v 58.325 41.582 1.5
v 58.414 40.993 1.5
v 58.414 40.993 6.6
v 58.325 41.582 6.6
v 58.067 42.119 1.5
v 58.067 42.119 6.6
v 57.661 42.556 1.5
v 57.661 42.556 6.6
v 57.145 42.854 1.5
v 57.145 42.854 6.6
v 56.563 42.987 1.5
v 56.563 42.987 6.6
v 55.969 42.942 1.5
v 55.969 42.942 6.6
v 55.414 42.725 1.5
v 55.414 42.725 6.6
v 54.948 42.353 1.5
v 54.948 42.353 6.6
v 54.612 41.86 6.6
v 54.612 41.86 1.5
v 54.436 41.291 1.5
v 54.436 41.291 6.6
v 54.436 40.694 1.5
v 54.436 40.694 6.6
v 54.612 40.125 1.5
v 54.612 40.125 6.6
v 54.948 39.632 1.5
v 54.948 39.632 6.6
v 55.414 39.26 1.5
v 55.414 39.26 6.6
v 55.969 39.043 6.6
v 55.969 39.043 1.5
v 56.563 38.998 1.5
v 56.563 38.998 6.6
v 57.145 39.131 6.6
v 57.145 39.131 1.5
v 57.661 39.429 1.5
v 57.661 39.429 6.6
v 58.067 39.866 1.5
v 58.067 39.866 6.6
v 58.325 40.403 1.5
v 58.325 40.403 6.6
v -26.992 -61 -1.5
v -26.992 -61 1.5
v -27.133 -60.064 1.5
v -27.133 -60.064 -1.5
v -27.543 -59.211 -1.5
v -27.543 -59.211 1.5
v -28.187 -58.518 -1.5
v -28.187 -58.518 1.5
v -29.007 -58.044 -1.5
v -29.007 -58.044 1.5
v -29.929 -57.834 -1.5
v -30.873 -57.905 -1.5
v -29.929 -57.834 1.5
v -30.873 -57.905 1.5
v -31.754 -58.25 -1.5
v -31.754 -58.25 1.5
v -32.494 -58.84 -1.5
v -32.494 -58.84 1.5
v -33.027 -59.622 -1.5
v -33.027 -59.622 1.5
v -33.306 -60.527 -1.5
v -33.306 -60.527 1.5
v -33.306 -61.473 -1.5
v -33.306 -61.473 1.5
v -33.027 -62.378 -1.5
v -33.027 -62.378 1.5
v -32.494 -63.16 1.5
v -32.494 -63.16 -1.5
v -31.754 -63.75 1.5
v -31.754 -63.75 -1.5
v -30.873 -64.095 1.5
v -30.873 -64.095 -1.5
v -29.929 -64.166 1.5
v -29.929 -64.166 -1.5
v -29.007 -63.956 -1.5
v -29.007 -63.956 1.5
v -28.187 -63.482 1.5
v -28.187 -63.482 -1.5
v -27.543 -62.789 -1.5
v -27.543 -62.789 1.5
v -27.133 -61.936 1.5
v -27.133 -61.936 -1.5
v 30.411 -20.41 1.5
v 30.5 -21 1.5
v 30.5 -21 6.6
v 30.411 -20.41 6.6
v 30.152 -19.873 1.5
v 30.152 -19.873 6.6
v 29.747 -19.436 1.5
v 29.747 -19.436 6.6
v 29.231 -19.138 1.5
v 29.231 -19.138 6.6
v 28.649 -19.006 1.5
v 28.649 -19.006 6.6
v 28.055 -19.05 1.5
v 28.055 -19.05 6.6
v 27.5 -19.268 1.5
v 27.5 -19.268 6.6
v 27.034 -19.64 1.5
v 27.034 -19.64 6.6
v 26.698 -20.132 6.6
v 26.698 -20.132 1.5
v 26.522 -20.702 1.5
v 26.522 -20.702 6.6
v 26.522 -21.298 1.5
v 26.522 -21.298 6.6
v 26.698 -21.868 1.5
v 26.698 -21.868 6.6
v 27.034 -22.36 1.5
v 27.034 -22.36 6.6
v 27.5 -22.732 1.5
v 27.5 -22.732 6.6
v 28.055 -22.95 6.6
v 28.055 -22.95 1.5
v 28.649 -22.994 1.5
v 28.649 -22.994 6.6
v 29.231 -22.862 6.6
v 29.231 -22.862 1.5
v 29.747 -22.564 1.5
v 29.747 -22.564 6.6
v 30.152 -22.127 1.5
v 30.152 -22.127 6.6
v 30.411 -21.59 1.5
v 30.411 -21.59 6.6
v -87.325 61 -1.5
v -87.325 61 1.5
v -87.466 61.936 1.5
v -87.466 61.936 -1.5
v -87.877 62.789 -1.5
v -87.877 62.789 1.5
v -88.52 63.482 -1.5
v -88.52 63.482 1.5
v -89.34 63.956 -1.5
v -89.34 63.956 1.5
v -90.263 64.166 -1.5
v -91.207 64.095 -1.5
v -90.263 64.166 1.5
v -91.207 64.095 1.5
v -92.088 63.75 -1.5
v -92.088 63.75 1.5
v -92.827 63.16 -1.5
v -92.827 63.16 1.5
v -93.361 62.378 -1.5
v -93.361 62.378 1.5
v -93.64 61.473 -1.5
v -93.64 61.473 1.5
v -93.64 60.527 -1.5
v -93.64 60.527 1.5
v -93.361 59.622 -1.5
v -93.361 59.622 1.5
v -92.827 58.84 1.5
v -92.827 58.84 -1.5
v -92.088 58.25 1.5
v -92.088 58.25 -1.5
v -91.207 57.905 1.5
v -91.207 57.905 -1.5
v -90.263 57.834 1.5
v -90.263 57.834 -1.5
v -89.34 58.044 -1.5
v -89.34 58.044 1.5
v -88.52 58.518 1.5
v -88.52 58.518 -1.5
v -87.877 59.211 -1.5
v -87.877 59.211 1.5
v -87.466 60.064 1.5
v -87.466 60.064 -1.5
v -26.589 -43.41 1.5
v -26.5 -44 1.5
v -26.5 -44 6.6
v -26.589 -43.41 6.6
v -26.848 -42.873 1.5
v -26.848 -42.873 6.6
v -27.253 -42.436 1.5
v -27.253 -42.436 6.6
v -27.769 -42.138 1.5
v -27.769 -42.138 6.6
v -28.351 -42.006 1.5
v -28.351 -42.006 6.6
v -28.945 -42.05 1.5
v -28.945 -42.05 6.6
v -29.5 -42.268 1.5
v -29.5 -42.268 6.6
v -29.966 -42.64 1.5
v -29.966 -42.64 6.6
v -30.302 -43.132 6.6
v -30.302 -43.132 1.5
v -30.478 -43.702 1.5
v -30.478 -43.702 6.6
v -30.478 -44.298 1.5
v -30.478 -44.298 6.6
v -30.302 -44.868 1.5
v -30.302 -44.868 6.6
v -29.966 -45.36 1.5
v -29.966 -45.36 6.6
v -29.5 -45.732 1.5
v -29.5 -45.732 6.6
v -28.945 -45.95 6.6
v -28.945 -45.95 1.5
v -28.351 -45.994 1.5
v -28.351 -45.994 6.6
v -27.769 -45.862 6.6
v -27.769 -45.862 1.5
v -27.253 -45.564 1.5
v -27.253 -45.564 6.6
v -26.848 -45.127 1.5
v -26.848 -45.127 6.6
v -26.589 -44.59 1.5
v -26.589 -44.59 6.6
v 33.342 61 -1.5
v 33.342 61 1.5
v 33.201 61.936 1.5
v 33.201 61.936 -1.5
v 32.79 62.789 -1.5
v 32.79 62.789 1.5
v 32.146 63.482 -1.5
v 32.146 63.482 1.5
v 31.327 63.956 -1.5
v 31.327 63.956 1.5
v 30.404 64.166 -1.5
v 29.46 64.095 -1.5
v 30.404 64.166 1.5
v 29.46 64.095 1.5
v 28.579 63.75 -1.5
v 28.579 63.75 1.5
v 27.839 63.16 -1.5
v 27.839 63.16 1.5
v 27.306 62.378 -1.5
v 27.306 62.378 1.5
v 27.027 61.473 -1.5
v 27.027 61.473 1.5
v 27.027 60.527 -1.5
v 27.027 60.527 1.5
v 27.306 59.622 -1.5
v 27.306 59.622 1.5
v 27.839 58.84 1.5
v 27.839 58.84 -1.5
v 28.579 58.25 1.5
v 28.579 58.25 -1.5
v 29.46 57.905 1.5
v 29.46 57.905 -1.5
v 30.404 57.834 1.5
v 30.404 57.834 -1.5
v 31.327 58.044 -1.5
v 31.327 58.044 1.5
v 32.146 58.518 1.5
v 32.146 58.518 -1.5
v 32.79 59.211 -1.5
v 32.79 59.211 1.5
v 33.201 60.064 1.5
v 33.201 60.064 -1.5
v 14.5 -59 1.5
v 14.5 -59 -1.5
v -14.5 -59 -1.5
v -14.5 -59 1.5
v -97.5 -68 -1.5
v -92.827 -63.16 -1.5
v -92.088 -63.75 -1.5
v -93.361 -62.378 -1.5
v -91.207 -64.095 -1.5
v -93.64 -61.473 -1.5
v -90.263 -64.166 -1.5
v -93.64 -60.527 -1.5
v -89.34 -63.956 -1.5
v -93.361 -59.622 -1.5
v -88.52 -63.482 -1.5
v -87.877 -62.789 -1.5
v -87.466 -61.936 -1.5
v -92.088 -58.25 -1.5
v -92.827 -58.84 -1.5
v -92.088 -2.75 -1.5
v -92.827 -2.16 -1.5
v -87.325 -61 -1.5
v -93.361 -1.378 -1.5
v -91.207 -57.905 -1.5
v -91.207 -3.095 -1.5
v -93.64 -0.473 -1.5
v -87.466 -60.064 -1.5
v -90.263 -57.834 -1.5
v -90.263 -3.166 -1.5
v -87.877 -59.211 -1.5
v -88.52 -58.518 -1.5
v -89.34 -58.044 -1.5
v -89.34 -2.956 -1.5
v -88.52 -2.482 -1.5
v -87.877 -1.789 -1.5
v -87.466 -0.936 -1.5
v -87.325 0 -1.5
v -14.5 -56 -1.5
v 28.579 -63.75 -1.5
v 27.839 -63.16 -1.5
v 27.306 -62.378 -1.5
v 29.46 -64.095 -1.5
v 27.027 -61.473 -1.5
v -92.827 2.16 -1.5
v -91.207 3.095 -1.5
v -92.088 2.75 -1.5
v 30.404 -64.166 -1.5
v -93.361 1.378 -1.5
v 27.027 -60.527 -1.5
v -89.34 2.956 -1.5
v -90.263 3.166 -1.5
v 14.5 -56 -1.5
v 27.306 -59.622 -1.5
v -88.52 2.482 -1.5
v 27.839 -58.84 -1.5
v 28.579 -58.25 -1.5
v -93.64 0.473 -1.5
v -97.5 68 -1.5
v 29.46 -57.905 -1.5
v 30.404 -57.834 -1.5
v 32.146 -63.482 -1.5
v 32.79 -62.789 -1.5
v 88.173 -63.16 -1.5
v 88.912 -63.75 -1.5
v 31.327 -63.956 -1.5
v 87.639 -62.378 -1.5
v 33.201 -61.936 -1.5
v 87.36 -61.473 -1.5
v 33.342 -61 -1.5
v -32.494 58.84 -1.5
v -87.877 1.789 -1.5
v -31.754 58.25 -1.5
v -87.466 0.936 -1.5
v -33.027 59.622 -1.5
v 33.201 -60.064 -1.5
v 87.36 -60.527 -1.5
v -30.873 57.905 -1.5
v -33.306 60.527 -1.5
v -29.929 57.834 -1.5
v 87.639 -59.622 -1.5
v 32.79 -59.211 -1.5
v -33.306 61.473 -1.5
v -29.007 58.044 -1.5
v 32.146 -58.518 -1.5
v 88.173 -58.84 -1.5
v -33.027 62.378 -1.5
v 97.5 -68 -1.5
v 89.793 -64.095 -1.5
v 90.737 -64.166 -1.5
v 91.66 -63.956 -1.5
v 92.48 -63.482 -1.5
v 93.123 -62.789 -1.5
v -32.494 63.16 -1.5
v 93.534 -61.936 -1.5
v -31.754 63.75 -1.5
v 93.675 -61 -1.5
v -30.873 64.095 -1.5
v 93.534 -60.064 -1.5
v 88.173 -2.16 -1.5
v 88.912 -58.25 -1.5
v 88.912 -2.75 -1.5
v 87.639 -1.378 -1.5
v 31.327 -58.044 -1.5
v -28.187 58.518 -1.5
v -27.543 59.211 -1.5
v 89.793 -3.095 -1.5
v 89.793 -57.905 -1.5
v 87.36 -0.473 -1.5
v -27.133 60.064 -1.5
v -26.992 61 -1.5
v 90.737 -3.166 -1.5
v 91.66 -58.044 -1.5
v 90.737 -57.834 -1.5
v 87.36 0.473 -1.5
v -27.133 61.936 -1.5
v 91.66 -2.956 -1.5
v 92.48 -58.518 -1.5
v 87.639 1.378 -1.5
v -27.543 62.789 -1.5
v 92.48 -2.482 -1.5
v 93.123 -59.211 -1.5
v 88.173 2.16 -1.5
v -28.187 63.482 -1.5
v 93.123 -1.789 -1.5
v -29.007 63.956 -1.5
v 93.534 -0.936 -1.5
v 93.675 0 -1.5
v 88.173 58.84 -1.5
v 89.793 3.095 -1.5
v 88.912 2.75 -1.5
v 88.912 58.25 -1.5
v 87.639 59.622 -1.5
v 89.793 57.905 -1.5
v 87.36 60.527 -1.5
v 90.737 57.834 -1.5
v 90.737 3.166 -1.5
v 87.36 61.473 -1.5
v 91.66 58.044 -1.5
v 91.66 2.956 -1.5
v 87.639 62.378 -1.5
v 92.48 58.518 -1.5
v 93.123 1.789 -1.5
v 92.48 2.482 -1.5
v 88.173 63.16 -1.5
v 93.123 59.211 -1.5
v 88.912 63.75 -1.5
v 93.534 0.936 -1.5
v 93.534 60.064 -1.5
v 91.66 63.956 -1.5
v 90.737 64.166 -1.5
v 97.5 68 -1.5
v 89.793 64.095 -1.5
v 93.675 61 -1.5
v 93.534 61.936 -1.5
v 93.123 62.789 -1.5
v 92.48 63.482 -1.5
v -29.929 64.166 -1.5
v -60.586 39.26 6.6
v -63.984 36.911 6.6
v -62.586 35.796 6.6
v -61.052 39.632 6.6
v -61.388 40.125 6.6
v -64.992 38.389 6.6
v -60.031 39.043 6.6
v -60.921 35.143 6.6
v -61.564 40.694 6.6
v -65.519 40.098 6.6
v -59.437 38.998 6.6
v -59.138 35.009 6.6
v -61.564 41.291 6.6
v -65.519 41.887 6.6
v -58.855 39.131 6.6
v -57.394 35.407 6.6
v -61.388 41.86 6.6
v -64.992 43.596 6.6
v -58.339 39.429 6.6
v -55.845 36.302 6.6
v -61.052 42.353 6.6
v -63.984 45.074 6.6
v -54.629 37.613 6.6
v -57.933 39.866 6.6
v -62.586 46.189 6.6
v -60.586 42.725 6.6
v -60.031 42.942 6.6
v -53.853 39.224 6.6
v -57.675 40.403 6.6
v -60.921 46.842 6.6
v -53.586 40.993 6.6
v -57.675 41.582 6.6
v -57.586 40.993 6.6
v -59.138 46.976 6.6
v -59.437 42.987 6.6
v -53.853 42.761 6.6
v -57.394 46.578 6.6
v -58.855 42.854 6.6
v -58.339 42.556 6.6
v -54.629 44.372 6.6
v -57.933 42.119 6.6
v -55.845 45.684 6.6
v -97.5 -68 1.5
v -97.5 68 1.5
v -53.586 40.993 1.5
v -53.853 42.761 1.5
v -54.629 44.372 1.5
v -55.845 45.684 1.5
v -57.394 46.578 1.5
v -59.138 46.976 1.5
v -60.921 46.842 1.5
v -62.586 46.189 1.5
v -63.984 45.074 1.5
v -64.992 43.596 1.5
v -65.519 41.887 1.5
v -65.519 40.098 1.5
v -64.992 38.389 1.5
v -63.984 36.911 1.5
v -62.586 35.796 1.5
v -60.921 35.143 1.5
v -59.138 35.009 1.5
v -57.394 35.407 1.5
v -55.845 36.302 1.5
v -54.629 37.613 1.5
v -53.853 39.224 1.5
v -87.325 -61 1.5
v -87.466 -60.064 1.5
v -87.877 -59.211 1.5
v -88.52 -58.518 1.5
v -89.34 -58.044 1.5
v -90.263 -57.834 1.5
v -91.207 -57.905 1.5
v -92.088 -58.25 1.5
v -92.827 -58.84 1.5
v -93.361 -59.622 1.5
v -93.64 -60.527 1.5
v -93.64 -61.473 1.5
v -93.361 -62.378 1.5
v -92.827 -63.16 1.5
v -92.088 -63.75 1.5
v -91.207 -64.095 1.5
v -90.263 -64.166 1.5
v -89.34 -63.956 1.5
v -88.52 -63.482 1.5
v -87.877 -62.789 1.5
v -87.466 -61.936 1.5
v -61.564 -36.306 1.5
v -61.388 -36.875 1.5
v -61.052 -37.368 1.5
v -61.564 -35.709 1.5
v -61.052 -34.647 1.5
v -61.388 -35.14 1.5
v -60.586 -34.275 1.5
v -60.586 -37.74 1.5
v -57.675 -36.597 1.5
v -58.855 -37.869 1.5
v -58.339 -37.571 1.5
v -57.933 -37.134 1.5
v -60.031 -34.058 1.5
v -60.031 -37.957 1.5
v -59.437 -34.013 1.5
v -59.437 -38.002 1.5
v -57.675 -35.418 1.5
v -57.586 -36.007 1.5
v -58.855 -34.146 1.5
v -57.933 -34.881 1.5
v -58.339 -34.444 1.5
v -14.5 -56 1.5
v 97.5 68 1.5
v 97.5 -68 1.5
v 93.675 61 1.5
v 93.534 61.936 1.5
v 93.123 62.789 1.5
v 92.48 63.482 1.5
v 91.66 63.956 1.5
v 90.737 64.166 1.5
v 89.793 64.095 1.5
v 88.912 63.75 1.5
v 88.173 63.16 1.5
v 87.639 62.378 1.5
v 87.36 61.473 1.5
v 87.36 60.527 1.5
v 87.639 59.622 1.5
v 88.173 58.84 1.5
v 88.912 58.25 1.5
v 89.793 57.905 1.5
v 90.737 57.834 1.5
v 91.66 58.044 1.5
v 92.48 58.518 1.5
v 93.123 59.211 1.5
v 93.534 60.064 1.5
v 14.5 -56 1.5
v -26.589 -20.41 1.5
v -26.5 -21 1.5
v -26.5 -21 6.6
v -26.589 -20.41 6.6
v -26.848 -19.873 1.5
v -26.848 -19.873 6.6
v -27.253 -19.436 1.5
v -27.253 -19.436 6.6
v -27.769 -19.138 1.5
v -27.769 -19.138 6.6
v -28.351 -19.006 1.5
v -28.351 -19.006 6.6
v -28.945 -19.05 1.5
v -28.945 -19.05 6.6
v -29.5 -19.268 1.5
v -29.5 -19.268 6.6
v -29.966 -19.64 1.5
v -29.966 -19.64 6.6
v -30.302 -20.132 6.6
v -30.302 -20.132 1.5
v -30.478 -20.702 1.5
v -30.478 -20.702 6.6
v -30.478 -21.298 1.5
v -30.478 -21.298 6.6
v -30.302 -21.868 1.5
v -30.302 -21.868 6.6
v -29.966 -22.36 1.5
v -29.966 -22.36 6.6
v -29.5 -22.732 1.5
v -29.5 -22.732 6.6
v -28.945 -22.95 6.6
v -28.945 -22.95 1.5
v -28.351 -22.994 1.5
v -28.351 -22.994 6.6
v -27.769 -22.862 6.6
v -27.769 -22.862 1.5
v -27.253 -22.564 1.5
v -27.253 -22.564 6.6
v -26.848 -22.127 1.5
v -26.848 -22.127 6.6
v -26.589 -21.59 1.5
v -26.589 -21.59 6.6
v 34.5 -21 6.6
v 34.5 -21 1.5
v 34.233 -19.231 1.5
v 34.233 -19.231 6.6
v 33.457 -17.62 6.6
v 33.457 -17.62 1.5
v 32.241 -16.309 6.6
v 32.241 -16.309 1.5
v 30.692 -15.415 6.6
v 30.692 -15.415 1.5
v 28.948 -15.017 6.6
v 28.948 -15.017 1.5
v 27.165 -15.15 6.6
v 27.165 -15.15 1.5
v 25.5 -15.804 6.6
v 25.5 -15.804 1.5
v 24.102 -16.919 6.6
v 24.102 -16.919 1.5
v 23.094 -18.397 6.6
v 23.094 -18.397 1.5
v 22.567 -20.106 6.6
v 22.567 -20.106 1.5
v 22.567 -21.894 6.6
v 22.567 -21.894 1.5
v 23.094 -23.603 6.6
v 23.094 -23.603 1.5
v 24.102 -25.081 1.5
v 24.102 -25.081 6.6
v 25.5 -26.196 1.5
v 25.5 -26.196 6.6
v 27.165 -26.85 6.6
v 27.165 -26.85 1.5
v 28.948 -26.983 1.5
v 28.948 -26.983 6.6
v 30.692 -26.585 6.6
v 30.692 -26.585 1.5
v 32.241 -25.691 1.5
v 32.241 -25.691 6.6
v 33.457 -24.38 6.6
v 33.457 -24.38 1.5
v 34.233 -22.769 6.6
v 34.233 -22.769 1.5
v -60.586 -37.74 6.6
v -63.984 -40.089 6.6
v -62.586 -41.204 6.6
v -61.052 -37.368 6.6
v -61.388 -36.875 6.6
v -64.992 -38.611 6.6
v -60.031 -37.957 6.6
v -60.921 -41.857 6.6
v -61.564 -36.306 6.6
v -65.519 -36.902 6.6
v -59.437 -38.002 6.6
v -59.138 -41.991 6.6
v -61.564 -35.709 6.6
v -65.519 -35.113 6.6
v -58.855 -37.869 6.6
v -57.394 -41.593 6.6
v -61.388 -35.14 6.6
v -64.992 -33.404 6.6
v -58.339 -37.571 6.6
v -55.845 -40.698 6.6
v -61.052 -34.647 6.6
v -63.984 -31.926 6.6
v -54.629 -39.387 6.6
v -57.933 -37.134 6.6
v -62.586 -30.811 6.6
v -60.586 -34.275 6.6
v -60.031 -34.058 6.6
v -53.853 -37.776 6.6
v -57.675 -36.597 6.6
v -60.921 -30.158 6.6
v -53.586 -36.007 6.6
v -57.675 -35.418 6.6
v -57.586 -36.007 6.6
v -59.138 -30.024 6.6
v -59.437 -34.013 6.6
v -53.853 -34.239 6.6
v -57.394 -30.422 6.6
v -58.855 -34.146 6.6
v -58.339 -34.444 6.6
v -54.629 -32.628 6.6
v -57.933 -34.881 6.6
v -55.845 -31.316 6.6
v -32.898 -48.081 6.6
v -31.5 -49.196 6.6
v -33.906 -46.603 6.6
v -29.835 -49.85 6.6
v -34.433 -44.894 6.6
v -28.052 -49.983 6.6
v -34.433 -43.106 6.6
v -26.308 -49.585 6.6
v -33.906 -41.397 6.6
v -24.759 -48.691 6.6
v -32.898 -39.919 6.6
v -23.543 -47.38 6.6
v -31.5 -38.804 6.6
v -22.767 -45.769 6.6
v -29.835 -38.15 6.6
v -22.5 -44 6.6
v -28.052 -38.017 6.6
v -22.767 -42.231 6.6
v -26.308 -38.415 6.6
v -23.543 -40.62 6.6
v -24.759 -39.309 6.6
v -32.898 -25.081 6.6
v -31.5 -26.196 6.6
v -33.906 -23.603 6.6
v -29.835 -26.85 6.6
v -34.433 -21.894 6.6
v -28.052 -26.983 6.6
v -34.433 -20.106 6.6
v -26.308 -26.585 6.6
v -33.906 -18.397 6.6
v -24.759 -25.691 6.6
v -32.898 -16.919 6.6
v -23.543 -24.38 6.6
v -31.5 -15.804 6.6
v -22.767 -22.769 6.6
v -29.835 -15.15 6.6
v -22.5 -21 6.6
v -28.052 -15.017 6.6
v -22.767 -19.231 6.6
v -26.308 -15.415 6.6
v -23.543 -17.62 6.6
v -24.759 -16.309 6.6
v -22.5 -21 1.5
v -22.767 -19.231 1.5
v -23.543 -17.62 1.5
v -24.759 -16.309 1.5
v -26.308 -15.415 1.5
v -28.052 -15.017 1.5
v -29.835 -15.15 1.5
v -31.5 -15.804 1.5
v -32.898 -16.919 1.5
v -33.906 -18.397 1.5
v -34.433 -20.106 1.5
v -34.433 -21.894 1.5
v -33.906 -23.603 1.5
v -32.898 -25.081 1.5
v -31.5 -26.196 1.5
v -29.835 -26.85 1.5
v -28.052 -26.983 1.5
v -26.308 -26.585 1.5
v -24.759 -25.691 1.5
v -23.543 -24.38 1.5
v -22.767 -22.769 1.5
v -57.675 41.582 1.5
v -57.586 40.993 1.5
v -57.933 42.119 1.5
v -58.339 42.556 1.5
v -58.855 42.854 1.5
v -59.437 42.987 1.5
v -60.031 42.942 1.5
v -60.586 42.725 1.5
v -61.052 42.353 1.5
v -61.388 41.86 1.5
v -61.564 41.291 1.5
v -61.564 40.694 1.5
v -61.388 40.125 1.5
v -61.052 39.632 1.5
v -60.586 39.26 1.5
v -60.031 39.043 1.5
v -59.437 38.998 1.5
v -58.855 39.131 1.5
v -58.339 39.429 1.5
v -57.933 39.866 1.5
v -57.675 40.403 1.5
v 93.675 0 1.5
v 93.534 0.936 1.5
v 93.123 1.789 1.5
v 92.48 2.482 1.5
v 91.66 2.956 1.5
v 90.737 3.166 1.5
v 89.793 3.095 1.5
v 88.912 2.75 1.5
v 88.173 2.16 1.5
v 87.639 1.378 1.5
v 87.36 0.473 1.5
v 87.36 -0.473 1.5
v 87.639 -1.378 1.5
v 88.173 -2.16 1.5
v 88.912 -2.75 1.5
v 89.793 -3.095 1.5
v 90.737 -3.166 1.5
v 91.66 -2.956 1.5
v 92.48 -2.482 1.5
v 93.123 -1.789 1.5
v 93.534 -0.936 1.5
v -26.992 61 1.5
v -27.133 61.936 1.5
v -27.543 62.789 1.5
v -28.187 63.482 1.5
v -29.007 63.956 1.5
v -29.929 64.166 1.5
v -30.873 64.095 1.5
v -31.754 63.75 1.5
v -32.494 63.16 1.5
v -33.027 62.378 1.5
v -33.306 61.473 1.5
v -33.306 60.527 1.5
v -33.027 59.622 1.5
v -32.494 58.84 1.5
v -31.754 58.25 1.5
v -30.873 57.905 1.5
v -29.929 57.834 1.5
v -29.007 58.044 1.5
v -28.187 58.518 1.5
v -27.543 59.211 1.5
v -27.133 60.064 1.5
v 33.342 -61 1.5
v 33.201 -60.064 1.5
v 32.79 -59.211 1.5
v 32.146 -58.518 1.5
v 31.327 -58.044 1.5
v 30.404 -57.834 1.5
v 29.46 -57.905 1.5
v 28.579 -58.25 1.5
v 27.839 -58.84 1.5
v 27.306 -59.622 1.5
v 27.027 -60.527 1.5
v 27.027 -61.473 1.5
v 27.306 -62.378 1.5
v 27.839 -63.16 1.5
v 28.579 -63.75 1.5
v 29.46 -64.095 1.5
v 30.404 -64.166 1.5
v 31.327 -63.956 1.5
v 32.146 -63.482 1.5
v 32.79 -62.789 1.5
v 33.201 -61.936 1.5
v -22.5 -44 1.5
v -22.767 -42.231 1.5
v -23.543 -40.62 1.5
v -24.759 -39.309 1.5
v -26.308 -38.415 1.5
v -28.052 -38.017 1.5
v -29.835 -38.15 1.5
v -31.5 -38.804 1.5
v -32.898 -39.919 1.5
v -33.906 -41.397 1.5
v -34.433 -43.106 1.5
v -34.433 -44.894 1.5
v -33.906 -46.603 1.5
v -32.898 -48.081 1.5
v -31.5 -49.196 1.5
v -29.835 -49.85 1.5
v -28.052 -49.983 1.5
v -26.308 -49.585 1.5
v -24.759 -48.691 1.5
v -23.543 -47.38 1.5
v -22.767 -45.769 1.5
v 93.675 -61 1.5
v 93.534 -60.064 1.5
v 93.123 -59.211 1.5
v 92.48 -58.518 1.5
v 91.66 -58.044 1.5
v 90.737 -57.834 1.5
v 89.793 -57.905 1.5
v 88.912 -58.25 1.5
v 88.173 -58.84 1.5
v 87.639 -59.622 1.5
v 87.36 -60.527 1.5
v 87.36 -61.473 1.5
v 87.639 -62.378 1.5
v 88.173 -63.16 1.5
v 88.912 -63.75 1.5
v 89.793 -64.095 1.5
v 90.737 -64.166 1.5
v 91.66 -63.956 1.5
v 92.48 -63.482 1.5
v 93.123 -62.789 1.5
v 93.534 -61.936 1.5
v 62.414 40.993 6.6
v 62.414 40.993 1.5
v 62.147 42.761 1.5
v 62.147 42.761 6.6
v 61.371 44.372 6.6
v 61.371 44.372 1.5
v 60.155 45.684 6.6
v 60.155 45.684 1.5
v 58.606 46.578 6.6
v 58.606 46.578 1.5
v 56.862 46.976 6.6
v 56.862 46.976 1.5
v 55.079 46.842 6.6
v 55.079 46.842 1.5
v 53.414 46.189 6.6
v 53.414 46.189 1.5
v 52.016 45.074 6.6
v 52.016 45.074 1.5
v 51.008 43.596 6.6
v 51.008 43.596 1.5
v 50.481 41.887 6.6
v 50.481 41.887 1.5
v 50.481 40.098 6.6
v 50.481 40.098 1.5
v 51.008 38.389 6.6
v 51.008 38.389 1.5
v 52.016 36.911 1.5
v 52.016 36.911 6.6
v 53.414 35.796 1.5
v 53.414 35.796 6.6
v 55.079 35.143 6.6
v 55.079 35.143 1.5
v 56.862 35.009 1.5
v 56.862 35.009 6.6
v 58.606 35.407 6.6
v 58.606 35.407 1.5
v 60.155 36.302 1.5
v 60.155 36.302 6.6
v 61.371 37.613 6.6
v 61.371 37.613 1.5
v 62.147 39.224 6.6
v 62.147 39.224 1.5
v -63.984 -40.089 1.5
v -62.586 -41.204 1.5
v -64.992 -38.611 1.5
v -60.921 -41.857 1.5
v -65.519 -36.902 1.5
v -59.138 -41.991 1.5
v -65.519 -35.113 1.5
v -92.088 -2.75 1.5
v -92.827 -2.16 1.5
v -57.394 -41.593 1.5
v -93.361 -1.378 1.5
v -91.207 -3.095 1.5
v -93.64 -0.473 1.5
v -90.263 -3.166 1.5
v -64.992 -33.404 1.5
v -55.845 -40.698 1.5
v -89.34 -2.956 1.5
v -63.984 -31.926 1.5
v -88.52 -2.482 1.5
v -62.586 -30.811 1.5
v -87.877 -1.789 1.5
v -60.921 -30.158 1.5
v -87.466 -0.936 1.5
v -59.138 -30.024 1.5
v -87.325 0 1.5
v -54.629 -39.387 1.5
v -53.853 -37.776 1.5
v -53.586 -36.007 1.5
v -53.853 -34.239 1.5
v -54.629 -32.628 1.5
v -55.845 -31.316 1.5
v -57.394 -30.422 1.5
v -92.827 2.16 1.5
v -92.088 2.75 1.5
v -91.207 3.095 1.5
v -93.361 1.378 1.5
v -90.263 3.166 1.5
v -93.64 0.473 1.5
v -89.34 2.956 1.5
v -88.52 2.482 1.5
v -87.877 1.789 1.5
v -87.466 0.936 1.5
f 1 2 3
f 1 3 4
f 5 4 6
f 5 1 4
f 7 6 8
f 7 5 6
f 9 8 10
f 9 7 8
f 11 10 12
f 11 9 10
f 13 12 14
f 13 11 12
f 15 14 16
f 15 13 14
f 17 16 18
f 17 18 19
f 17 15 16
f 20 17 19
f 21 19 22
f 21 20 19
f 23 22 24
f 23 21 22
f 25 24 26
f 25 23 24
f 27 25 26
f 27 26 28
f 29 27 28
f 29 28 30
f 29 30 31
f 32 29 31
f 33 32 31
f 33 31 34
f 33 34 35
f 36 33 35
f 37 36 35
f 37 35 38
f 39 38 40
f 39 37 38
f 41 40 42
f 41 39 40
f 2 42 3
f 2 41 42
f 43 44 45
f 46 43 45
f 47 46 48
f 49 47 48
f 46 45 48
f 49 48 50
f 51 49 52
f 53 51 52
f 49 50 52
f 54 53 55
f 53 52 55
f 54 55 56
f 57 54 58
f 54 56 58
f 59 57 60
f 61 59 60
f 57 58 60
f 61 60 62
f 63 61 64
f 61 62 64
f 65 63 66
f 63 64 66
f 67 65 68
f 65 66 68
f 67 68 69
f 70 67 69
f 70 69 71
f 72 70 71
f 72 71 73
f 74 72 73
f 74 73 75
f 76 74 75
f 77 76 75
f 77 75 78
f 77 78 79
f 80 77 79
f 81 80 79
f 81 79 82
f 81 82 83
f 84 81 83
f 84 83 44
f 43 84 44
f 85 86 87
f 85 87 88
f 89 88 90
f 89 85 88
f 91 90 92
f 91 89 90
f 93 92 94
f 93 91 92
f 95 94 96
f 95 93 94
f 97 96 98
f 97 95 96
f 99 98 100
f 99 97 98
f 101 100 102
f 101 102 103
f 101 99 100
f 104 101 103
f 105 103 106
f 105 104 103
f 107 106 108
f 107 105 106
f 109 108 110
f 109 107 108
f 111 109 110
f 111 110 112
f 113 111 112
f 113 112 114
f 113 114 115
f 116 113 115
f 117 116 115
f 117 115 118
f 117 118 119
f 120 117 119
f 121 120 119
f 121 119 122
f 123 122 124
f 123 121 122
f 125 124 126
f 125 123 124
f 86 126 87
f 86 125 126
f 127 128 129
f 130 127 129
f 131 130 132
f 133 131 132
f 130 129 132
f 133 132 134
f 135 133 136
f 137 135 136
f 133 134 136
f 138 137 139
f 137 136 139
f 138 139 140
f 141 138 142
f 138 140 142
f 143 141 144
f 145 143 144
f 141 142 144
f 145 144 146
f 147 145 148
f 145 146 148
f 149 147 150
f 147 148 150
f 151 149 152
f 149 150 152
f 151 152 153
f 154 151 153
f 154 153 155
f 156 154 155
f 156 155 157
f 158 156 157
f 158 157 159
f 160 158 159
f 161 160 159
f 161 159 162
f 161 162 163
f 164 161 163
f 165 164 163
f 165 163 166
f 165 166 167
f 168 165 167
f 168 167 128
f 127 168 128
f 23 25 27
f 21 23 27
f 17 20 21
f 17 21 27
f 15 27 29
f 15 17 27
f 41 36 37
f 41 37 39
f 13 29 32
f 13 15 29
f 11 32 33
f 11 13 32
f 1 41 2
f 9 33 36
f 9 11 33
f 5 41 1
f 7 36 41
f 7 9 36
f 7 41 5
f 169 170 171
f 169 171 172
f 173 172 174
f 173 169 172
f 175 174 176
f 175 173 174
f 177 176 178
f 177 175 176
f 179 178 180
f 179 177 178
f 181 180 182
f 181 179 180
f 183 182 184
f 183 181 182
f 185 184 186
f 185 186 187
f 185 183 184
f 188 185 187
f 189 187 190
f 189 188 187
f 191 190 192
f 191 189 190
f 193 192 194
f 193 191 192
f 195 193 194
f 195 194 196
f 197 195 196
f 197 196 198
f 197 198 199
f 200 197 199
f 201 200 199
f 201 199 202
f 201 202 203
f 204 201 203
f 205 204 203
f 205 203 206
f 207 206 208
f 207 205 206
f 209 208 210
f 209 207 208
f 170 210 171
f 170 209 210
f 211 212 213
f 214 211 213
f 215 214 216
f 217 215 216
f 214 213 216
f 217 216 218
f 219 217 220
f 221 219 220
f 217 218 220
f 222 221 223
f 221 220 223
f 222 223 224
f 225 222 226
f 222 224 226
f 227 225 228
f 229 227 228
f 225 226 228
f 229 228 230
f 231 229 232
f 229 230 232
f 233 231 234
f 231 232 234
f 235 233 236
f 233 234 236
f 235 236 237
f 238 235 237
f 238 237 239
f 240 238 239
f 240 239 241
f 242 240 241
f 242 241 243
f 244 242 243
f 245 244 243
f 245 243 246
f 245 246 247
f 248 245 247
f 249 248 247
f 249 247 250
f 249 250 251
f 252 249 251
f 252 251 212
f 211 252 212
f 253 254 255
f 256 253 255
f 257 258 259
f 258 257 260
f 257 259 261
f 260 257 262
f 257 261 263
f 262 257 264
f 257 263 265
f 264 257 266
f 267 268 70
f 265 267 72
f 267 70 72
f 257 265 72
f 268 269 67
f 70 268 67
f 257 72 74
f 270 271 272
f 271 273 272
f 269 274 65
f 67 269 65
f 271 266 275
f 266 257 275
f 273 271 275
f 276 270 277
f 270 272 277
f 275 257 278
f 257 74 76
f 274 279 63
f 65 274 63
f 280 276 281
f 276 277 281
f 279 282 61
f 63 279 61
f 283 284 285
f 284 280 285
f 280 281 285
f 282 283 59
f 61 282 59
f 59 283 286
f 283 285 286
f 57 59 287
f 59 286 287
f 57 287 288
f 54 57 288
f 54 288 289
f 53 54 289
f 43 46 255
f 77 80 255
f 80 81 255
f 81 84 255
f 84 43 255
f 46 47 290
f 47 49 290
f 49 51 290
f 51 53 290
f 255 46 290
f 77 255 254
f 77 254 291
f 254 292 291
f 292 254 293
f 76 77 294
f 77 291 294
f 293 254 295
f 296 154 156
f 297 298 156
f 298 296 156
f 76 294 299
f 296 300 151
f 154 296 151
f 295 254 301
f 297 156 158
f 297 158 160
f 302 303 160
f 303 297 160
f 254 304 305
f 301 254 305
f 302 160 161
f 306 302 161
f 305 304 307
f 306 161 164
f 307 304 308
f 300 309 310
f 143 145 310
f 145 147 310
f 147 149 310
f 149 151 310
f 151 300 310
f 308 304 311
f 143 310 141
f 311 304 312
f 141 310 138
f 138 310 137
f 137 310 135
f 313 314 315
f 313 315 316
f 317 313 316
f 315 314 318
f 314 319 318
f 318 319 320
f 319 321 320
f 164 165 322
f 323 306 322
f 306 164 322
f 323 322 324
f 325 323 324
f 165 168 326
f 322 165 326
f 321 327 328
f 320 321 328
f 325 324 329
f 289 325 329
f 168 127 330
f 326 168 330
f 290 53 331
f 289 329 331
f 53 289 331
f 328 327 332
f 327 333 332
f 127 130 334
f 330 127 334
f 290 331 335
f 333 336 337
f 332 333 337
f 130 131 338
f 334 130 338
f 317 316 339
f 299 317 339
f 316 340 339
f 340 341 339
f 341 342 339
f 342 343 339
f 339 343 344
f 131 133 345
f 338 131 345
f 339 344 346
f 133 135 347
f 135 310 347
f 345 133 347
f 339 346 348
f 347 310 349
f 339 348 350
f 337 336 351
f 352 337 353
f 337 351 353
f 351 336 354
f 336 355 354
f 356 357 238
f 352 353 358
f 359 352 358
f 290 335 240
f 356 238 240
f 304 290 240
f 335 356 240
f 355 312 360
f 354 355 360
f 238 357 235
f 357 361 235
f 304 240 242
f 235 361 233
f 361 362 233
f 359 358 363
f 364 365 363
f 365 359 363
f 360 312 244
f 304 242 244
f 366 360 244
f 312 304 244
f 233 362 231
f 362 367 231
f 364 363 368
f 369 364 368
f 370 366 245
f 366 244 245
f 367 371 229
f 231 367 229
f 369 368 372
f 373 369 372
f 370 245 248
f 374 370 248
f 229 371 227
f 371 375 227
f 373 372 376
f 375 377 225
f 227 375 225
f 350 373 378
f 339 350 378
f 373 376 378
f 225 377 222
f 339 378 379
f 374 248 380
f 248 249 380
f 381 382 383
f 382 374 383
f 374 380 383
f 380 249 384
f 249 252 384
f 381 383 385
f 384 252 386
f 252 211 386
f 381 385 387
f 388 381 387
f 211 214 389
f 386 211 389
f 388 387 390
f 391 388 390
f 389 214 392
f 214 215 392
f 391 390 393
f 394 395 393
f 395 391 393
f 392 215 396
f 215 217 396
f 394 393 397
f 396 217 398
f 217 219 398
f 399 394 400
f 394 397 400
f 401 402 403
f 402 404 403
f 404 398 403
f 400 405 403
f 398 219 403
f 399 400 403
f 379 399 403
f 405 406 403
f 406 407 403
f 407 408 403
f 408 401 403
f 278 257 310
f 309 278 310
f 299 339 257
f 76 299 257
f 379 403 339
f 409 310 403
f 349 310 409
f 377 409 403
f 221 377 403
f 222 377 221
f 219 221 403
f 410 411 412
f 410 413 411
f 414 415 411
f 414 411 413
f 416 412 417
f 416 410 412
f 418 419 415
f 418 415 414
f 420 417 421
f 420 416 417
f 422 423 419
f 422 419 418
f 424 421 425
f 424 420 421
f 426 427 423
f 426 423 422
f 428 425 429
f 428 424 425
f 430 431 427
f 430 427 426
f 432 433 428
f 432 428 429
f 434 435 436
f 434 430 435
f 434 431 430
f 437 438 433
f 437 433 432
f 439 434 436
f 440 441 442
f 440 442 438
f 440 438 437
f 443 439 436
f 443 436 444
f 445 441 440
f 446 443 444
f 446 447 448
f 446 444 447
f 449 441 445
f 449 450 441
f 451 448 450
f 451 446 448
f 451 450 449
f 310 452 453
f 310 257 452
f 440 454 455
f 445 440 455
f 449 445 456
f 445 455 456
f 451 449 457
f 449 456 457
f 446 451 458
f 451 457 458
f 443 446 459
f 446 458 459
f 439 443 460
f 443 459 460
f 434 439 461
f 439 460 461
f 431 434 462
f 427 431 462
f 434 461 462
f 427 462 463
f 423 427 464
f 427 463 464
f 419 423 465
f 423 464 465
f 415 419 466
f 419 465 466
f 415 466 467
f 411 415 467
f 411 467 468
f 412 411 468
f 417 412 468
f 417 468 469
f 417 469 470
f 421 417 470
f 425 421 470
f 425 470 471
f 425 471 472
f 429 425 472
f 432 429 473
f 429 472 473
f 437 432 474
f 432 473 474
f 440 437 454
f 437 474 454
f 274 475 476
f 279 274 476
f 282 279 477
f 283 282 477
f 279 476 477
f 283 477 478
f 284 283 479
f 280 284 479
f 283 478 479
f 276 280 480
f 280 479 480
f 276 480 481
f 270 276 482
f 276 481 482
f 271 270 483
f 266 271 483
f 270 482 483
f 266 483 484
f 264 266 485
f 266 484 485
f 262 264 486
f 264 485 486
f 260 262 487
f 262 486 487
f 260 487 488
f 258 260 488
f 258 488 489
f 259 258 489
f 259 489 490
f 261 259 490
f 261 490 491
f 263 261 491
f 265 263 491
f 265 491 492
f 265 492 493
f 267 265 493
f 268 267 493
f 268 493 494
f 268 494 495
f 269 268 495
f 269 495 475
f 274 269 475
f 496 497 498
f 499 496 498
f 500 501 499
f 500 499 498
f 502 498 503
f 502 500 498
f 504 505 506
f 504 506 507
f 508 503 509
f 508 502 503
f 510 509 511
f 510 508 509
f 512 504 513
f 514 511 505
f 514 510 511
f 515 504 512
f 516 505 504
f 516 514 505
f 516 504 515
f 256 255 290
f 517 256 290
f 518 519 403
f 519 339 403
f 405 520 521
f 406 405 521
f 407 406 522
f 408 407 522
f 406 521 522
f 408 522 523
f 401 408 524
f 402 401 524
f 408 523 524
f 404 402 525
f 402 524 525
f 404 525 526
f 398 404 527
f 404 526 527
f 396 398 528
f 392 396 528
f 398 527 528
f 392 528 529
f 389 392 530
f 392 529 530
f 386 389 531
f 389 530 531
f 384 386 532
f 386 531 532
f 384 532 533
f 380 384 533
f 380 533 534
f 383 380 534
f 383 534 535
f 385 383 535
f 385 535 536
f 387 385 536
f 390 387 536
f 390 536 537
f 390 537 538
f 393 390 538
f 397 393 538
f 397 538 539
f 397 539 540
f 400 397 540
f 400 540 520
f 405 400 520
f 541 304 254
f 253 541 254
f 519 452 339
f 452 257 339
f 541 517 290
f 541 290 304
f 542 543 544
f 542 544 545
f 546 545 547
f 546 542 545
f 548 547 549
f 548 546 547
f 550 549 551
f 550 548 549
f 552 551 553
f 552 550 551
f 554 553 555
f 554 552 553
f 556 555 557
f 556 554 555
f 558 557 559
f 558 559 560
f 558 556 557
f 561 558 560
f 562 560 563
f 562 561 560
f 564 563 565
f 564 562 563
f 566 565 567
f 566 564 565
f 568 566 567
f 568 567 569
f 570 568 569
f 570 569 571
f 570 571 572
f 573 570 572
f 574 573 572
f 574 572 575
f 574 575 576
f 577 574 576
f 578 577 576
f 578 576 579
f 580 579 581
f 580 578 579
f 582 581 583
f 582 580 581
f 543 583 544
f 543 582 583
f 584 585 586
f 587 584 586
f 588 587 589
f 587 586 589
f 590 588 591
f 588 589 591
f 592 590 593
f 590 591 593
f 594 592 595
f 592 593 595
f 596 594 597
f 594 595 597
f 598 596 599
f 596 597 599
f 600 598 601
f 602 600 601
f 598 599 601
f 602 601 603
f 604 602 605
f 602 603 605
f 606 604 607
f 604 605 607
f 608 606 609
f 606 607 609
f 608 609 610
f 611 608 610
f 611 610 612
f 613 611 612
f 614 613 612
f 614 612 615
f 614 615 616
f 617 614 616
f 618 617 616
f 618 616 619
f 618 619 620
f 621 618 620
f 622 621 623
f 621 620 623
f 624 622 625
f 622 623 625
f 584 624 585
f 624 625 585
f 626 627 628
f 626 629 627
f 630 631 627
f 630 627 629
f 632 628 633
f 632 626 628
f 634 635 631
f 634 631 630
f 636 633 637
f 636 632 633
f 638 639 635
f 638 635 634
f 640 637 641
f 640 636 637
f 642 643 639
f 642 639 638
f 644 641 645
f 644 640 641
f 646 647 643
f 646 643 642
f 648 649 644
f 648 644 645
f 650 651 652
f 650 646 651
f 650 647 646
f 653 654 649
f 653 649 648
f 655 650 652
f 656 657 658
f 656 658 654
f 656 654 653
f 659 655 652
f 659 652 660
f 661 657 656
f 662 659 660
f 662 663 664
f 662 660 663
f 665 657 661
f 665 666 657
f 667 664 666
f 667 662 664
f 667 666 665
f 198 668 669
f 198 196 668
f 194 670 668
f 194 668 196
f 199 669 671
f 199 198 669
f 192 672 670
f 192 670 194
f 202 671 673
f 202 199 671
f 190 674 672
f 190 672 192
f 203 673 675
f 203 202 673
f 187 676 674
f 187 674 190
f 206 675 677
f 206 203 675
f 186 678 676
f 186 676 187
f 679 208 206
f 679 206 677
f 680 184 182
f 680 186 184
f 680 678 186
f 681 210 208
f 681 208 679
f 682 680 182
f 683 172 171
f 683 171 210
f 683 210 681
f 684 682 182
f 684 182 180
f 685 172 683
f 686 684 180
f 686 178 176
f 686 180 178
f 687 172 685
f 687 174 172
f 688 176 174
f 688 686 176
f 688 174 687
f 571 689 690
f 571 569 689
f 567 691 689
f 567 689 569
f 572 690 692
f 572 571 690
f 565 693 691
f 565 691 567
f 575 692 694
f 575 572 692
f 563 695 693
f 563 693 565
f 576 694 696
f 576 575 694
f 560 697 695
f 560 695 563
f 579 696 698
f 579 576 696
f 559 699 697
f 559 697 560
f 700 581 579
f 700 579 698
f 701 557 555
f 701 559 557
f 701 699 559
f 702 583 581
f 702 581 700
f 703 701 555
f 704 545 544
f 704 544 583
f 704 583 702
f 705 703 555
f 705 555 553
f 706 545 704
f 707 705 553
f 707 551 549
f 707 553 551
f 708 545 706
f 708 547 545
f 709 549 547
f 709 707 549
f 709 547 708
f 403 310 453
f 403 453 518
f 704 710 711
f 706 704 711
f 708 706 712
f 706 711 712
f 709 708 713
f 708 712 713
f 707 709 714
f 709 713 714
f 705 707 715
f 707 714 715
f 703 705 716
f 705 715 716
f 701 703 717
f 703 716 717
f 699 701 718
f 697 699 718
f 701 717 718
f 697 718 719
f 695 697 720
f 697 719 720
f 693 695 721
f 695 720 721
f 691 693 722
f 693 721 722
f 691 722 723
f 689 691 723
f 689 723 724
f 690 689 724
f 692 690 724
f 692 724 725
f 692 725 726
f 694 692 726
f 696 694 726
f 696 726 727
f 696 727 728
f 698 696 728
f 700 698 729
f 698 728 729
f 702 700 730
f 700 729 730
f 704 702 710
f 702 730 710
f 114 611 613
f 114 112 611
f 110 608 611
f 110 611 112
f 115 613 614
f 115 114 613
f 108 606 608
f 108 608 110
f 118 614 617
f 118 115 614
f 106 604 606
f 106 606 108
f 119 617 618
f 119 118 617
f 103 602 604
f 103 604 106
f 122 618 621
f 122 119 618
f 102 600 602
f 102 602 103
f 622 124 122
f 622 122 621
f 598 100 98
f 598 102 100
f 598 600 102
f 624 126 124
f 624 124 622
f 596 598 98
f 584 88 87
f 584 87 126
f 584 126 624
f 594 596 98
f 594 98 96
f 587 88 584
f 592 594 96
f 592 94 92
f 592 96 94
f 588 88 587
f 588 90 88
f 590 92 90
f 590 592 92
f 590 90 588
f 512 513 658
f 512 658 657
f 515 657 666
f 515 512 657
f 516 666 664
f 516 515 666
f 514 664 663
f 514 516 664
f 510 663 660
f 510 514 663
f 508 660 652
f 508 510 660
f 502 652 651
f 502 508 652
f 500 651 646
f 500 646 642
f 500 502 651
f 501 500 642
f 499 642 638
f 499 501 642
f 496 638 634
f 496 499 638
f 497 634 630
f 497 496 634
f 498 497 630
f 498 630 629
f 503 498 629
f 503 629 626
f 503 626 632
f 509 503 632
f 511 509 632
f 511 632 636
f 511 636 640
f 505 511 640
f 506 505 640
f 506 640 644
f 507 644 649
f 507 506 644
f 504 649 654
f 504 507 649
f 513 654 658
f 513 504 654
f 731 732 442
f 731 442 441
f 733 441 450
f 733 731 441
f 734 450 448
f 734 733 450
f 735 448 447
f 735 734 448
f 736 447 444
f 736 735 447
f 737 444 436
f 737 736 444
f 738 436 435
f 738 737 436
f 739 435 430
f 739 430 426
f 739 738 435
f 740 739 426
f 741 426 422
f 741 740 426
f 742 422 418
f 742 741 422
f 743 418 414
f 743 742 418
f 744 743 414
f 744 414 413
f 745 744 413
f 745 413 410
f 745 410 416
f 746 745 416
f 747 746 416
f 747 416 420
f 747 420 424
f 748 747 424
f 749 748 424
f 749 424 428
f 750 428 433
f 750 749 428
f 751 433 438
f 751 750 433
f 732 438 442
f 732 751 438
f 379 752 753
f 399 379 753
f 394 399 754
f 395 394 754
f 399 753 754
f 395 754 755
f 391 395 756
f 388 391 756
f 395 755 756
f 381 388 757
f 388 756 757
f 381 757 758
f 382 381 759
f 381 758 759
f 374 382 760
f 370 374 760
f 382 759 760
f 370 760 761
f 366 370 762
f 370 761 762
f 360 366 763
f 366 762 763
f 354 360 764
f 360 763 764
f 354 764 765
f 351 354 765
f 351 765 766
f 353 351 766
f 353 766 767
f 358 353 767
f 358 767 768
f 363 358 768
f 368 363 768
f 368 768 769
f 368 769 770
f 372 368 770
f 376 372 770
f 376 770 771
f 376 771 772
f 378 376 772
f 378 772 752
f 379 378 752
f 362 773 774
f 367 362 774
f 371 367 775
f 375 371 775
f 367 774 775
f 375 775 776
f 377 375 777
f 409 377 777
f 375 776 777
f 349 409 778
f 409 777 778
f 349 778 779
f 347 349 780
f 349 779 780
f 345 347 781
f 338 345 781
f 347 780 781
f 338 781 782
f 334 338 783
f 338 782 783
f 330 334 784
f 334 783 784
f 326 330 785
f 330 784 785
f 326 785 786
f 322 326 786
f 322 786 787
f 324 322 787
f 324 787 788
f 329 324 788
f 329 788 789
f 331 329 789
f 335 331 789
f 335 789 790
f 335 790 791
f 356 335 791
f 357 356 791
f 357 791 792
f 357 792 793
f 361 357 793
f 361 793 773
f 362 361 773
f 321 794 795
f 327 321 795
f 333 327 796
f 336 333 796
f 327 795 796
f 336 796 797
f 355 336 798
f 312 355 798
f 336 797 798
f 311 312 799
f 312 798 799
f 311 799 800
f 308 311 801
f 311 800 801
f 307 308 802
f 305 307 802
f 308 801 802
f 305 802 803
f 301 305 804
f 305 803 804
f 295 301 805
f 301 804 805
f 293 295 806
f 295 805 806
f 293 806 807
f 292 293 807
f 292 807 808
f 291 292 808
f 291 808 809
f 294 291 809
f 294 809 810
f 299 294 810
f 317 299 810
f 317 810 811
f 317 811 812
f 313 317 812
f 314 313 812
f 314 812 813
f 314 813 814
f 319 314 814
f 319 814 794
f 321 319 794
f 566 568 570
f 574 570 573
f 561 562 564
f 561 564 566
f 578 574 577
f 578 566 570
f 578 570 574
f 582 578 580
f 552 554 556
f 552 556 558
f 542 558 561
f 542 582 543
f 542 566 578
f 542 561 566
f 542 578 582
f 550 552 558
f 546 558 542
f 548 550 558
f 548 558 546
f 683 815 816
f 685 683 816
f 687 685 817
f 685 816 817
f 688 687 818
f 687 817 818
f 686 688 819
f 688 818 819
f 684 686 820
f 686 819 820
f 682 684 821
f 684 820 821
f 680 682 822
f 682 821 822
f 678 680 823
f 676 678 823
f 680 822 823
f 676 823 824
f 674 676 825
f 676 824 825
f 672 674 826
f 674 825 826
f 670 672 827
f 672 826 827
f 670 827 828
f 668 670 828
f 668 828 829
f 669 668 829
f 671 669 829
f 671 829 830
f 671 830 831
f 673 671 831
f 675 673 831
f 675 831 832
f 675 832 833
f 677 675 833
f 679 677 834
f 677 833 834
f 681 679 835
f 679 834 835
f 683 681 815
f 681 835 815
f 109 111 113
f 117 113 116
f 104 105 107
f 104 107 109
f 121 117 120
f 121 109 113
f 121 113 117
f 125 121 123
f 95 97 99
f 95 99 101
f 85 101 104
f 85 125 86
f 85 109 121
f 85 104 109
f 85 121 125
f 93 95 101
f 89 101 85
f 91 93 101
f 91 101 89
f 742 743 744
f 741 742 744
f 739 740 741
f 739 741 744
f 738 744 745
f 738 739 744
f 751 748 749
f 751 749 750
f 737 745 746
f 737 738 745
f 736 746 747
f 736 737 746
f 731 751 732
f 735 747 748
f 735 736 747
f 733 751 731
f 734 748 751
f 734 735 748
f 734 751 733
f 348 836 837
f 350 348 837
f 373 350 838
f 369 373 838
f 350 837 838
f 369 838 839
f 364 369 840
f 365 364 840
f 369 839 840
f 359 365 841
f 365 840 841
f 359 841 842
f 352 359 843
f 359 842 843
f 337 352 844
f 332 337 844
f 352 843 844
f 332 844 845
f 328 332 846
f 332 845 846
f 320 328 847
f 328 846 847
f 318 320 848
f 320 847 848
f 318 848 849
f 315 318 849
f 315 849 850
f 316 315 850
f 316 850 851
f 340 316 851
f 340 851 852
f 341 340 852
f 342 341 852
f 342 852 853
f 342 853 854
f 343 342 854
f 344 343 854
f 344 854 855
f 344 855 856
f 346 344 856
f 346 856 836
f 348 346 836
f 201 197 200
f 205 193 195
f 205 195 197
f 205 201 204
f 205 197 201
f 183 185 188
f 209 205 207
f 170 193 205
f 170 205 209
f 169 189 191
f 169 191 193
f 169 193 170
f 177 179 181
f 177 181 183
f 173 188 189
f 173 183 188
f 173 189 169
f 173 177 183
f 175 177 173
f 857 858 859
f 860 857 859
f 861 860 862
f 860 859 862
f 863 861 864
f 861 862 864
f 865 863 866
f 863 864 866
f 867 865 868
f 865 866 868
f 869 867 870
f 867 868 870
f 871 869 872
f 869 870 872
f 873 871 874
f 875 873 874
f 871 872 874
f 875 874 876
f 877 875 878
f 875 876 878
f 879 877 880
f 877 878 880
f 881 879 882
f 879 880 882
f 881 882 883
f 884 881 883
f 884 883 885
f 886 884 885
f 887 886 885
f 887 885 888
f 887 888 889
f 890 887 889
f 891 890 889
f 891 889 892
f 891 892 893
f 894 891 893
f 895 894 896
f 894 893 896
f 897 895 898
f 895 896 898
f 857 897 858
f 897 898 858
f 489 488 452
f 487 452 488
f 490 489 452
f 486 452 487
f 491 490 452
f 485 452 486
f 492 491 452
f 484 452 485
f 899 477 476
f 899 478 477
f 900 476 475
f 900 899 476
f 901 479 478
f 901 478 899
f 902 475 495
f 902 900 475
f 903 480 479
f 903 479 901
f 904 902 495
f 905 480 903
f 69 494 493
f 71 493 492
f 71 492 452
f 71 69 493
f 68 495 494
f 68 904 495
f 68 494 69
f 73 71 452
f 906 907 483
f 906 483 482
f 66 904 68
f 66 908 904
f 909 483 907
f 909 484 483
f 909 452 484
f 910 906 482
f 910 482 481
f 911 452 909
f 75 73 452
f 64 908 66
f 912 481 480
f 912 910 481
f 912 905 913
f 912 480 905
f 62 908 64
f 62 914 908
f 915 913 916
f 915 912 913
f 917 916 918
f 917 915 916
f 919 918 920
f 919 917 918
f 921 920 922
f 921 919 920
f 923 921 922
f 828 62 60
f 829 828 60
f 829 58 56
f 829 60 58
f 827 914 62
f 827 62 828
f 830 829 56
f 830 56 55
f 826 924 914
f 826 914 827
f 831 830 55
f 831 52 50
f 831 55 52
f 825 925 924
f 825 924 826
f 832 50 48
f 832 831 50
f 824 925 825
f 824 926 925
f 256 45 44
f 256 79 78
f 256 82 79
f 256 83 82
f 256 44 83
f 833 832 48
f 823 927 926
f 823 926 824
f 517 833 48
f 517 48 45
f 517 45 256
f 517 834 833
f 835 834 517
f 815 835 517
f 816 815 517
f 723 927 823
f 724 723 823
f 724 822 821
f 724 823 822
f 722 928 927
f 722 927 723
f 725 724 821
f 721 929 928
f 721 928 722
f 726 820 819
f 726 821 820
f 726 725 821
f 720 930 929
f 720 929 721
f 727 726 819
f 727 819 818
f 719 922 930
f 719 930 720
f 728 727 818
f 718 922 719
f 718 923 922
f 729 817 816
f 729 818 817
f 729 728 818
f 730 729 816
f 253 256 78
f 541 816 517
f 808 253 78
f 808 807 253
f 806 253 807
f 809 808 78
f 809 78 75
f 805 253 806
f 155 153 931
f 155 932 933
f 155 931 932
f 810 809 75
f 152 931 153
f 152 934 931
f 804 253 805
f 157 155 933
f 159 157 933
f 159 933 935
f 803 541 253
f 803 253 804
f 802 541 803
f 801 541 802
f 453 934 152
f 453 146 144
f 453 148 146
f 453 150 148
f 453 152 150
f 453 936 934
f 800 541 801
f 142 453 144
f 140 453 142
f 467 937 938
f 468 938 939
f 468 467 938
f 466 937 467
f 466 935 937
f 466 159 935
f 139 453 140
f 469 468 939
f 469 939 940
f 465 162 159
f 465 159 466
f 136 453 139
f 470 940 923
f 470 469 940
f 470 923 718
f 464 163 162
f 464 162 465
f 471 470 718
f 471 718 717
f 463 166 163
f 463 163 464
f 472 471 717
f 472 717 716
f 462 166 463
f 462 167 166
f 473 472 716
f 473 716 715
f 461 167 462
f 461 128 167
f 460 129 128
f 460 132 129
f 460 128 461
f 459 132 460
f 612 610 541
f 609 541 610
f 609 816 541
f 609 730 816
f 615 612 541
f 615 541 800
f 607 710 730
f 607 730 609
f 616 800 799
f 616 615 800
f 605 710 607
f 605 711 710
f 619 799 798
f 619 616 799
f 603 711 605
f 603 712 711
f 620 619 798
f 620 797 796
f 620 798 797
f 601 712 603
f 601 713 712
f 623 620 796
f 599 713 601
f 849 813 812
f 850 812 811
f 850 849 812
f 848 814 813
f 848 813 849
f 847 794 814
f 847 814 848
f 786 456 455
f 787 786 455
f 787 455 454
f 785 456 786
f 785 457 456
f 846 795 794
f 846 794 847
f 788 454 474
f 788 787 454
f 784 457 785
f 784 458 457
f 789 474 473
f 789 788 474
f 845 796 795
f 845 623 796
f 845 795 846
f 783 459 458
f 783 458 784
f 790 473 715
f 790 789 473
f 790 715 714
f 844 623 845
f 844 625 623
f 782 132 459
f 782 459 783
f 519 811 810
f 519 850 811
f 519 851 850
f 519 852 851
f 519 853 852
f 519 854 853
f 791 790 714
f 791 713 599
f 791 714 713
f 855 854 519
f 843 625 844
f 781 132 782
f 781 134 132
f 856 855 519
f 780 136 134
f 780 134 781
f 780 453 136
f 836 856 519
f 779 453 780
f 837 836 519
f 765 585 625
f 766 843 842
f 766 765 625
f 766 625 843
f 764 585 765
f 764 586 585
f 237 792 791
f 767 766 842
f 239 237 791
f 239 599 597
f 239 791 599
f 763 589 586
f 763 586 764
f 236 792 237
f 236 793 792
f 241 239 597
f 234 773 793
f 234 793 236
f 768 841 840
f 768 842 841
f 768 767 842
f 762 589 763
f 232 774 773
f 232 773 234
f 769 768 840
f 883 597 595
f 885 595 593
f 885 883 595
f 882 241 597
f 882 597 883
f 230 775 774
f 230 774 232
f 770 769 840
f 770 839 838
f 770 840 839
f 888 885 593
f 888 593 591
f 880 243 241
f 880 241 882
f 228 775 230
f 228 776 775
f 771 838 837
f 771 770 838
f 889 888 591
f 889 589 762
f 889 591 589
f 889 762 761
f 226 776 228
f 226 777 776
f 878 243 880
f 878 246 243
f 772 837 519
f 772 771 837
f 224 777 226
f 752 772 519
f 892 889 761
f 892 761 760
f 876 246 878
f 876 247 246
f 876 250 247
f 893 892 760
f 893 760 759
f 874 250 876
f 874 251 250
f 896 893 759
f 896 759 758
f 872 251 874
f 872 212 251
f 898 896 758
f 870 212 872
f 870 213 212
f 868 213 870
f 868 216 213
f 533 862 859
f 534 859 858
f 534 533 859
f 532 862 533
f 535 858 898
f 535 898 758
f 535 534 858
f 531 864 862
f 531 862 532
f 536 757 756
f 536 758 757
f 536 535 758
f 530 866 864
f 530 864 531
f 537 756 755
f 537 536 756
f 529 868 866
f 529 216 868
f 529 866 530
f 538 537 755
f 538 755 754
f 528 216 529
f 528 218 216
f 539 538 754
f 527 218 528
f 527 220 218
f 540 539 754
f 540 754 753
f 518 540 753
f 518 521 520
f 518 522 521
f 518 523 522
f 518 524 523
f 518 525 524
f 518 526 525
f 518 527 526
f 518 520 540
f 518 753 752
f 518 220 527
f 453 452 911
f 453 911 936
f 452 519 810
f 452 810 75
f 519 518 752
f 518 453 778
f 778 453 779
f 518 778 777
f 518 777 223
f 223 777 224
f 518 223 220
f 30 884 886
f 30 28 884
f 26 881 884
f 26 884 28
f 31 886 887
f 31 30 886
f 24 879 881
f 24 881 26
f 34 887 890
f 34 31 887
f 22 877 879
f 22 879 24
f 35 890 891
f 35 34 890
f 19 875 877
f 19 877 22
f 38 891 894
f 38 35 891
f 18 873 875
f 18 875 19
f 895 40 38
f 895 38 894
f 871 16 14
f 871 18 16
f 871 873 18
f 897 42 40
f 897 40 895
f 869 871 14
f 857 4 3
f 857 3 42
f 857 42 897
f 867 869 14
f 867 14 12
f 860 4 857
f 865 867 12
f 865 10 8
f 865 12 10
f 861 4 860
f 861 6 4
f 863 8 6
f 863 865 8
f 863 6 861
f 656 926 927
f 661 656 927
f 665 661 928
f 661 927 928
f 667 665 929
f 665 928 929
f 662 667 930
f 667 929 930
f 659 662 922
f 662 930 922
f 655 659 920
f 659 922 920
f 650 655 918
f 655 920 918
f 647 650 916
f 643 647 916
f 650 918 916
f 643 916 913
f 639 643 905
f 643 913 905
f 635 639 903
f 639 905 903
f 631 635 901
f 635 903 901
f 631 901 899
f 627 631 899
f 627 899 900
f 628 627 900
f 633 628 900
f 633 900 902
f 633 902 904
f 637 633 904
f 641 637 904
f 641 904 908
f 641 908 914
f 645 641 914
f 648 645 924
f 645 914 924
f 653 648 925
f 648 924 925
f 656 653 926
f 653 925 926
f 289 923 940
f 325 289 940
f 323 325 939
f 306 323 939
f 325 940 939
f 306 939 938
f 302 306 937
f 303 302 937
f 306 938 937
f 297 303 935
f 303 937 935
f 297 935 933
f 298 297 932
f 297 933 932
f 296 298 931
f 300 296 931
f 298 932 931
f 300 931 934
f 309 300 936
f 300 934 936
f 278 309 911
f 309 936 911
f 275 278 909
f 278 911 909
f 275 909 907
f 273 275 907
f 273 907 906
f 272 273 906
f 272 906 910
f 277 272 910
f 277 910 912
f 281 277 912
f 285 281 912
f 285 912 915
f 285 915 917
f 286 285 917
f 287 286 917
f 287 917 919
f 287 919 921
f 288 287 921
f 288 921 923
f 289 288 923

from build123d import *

# Parameters (mm, degrees)
SKETCH1_W           = 195
SKETCH1_H           = 136
SKETCH1_W_2         = 29
SKETCH1_H_2         = 3
BOSS_EXTRUDE1_DEPTH = 1.5
SKETCH1_3_W         = 195
SKETCH1_3_H         = 136
SKETCH1_3_W_2       = 29
SKETCH1_3_H_2       = 3
BOSS_EXTRUDE2_DEPTH = 1.5
SKETCH2_R           = 3.175
CUT_EXTRUDE1_DEPTH  = 119.908578328
SKETCH3_R           = 6
SKETCH3_R_2         = 2
BOSS_EXTRUDE3_DEPTH = 5.1
SKETCH4_R           = 6
SKETCH4_R_2         = 2
BOSS_EXTRUDE6_DEPTH = 5.1


with BuildPart() as part:
    # Sketch1 → Boss-Extrude1 (new body)
    with BuildSketch(Plane.XY):
        Rectangle(SKETCH1_W, SKETCH1_H)
        with Locations((0, -57.5)):
            Rectangle(SKETCH1_W_2, SKETCH1_H_2, mode=Mode.SUBTRACT)
    extrude(amount=-BOSS_EXTRUDE1_DEPTH)

    # Sketch1<3> → Boss-Extrude2 (add)
    with BuildSketch(Plane.XY):
        Rectangle(SKETCH1_3_W, SKETCH1_3_H)
        with Locations((0, -57.5)):
            Rectangle(SKETCH1_3_W_2, SKETCH1_3_H_2, mode=Mode.SUBTRACT)
    extrude(amount=BOSS_EXTRUDE2_DEPTH)

    # Sketch2 → Cut-Extrude1 (cut, through all)
    with BuildSketch(Plane.XY.offset(1.5)):
        with Locations((-90.5, 61)):
            Circle(SKETCH2_R)
        with Locations((90.5, 61)):
            Circle(SKETCH2_R)
        with Locations((90.5, -61)):
            Circle(SKETCH2_R)
        with Locations((-90.5, -61)):
            Circle(SKETCH2_R)
        with Locations((-90.5, 0)):
            Circle(SKETCH2_R)
        with Locations((30.166666667, 61)):
            Circle(SKETCH2_R)
        with Locations((90.5, 0)):
            Circle(SKETCH2_R)
        with Locations((30.166666667, -61)):
            Circle(SKETCH2_R)
        with Locations((-30.166666667, -61)):
            Circle(SKETCH2_R)
        with Locations((-30.166666667, 61)):
            Circle(SKETCH2_R)
    extrude(amount=-CUT_EXTRUDE1_DEPTH, mode=Mode.SUBTRACT)

    # Sketch3 → Boss-Extrude3 (add)
    with BuildSketch(Plane.XY.offset(1.5)):
        with Locations((-28.5, -44)):
            Circle(SKETCH3_R)
        with Locations((-28.5, -44)):
            Circle(SKETCH3_R_2, mode=Mode.SUBTRACT)
    boss_extrude3 = extrude(amount=BOSS_EXTRUDE3_DEPTH)

    # Sketch-Pattern1: Boss-Extrude3 at 2 more places
    with Locations((0, 23, 0), (57, 23, 0)):
        add(boss_extrude3)

    # Sketch4 → Boss-Extrude6 (add)
    with BuildSketch(Plane.XY.offset(1.5)):
        with Locations((-59.585970737, -36.007477459)):
            Circle(SKETCH4_R)
        with Locations((-59.585970737, -36.007477459)):
            Circle(SKETCH4_R_2, mode=Mode.SUBTRACT)
    boss_extrude6 = extrude(amount=BOSS_EXTRUDE6_DEPTH)

    # Sketch-Pattern2: Boss-Extrude6 at 2 more places
    with Locations((0, 77, 0), (116, 77, 0)):
        add(boss_extrude6)


solid = part.part
